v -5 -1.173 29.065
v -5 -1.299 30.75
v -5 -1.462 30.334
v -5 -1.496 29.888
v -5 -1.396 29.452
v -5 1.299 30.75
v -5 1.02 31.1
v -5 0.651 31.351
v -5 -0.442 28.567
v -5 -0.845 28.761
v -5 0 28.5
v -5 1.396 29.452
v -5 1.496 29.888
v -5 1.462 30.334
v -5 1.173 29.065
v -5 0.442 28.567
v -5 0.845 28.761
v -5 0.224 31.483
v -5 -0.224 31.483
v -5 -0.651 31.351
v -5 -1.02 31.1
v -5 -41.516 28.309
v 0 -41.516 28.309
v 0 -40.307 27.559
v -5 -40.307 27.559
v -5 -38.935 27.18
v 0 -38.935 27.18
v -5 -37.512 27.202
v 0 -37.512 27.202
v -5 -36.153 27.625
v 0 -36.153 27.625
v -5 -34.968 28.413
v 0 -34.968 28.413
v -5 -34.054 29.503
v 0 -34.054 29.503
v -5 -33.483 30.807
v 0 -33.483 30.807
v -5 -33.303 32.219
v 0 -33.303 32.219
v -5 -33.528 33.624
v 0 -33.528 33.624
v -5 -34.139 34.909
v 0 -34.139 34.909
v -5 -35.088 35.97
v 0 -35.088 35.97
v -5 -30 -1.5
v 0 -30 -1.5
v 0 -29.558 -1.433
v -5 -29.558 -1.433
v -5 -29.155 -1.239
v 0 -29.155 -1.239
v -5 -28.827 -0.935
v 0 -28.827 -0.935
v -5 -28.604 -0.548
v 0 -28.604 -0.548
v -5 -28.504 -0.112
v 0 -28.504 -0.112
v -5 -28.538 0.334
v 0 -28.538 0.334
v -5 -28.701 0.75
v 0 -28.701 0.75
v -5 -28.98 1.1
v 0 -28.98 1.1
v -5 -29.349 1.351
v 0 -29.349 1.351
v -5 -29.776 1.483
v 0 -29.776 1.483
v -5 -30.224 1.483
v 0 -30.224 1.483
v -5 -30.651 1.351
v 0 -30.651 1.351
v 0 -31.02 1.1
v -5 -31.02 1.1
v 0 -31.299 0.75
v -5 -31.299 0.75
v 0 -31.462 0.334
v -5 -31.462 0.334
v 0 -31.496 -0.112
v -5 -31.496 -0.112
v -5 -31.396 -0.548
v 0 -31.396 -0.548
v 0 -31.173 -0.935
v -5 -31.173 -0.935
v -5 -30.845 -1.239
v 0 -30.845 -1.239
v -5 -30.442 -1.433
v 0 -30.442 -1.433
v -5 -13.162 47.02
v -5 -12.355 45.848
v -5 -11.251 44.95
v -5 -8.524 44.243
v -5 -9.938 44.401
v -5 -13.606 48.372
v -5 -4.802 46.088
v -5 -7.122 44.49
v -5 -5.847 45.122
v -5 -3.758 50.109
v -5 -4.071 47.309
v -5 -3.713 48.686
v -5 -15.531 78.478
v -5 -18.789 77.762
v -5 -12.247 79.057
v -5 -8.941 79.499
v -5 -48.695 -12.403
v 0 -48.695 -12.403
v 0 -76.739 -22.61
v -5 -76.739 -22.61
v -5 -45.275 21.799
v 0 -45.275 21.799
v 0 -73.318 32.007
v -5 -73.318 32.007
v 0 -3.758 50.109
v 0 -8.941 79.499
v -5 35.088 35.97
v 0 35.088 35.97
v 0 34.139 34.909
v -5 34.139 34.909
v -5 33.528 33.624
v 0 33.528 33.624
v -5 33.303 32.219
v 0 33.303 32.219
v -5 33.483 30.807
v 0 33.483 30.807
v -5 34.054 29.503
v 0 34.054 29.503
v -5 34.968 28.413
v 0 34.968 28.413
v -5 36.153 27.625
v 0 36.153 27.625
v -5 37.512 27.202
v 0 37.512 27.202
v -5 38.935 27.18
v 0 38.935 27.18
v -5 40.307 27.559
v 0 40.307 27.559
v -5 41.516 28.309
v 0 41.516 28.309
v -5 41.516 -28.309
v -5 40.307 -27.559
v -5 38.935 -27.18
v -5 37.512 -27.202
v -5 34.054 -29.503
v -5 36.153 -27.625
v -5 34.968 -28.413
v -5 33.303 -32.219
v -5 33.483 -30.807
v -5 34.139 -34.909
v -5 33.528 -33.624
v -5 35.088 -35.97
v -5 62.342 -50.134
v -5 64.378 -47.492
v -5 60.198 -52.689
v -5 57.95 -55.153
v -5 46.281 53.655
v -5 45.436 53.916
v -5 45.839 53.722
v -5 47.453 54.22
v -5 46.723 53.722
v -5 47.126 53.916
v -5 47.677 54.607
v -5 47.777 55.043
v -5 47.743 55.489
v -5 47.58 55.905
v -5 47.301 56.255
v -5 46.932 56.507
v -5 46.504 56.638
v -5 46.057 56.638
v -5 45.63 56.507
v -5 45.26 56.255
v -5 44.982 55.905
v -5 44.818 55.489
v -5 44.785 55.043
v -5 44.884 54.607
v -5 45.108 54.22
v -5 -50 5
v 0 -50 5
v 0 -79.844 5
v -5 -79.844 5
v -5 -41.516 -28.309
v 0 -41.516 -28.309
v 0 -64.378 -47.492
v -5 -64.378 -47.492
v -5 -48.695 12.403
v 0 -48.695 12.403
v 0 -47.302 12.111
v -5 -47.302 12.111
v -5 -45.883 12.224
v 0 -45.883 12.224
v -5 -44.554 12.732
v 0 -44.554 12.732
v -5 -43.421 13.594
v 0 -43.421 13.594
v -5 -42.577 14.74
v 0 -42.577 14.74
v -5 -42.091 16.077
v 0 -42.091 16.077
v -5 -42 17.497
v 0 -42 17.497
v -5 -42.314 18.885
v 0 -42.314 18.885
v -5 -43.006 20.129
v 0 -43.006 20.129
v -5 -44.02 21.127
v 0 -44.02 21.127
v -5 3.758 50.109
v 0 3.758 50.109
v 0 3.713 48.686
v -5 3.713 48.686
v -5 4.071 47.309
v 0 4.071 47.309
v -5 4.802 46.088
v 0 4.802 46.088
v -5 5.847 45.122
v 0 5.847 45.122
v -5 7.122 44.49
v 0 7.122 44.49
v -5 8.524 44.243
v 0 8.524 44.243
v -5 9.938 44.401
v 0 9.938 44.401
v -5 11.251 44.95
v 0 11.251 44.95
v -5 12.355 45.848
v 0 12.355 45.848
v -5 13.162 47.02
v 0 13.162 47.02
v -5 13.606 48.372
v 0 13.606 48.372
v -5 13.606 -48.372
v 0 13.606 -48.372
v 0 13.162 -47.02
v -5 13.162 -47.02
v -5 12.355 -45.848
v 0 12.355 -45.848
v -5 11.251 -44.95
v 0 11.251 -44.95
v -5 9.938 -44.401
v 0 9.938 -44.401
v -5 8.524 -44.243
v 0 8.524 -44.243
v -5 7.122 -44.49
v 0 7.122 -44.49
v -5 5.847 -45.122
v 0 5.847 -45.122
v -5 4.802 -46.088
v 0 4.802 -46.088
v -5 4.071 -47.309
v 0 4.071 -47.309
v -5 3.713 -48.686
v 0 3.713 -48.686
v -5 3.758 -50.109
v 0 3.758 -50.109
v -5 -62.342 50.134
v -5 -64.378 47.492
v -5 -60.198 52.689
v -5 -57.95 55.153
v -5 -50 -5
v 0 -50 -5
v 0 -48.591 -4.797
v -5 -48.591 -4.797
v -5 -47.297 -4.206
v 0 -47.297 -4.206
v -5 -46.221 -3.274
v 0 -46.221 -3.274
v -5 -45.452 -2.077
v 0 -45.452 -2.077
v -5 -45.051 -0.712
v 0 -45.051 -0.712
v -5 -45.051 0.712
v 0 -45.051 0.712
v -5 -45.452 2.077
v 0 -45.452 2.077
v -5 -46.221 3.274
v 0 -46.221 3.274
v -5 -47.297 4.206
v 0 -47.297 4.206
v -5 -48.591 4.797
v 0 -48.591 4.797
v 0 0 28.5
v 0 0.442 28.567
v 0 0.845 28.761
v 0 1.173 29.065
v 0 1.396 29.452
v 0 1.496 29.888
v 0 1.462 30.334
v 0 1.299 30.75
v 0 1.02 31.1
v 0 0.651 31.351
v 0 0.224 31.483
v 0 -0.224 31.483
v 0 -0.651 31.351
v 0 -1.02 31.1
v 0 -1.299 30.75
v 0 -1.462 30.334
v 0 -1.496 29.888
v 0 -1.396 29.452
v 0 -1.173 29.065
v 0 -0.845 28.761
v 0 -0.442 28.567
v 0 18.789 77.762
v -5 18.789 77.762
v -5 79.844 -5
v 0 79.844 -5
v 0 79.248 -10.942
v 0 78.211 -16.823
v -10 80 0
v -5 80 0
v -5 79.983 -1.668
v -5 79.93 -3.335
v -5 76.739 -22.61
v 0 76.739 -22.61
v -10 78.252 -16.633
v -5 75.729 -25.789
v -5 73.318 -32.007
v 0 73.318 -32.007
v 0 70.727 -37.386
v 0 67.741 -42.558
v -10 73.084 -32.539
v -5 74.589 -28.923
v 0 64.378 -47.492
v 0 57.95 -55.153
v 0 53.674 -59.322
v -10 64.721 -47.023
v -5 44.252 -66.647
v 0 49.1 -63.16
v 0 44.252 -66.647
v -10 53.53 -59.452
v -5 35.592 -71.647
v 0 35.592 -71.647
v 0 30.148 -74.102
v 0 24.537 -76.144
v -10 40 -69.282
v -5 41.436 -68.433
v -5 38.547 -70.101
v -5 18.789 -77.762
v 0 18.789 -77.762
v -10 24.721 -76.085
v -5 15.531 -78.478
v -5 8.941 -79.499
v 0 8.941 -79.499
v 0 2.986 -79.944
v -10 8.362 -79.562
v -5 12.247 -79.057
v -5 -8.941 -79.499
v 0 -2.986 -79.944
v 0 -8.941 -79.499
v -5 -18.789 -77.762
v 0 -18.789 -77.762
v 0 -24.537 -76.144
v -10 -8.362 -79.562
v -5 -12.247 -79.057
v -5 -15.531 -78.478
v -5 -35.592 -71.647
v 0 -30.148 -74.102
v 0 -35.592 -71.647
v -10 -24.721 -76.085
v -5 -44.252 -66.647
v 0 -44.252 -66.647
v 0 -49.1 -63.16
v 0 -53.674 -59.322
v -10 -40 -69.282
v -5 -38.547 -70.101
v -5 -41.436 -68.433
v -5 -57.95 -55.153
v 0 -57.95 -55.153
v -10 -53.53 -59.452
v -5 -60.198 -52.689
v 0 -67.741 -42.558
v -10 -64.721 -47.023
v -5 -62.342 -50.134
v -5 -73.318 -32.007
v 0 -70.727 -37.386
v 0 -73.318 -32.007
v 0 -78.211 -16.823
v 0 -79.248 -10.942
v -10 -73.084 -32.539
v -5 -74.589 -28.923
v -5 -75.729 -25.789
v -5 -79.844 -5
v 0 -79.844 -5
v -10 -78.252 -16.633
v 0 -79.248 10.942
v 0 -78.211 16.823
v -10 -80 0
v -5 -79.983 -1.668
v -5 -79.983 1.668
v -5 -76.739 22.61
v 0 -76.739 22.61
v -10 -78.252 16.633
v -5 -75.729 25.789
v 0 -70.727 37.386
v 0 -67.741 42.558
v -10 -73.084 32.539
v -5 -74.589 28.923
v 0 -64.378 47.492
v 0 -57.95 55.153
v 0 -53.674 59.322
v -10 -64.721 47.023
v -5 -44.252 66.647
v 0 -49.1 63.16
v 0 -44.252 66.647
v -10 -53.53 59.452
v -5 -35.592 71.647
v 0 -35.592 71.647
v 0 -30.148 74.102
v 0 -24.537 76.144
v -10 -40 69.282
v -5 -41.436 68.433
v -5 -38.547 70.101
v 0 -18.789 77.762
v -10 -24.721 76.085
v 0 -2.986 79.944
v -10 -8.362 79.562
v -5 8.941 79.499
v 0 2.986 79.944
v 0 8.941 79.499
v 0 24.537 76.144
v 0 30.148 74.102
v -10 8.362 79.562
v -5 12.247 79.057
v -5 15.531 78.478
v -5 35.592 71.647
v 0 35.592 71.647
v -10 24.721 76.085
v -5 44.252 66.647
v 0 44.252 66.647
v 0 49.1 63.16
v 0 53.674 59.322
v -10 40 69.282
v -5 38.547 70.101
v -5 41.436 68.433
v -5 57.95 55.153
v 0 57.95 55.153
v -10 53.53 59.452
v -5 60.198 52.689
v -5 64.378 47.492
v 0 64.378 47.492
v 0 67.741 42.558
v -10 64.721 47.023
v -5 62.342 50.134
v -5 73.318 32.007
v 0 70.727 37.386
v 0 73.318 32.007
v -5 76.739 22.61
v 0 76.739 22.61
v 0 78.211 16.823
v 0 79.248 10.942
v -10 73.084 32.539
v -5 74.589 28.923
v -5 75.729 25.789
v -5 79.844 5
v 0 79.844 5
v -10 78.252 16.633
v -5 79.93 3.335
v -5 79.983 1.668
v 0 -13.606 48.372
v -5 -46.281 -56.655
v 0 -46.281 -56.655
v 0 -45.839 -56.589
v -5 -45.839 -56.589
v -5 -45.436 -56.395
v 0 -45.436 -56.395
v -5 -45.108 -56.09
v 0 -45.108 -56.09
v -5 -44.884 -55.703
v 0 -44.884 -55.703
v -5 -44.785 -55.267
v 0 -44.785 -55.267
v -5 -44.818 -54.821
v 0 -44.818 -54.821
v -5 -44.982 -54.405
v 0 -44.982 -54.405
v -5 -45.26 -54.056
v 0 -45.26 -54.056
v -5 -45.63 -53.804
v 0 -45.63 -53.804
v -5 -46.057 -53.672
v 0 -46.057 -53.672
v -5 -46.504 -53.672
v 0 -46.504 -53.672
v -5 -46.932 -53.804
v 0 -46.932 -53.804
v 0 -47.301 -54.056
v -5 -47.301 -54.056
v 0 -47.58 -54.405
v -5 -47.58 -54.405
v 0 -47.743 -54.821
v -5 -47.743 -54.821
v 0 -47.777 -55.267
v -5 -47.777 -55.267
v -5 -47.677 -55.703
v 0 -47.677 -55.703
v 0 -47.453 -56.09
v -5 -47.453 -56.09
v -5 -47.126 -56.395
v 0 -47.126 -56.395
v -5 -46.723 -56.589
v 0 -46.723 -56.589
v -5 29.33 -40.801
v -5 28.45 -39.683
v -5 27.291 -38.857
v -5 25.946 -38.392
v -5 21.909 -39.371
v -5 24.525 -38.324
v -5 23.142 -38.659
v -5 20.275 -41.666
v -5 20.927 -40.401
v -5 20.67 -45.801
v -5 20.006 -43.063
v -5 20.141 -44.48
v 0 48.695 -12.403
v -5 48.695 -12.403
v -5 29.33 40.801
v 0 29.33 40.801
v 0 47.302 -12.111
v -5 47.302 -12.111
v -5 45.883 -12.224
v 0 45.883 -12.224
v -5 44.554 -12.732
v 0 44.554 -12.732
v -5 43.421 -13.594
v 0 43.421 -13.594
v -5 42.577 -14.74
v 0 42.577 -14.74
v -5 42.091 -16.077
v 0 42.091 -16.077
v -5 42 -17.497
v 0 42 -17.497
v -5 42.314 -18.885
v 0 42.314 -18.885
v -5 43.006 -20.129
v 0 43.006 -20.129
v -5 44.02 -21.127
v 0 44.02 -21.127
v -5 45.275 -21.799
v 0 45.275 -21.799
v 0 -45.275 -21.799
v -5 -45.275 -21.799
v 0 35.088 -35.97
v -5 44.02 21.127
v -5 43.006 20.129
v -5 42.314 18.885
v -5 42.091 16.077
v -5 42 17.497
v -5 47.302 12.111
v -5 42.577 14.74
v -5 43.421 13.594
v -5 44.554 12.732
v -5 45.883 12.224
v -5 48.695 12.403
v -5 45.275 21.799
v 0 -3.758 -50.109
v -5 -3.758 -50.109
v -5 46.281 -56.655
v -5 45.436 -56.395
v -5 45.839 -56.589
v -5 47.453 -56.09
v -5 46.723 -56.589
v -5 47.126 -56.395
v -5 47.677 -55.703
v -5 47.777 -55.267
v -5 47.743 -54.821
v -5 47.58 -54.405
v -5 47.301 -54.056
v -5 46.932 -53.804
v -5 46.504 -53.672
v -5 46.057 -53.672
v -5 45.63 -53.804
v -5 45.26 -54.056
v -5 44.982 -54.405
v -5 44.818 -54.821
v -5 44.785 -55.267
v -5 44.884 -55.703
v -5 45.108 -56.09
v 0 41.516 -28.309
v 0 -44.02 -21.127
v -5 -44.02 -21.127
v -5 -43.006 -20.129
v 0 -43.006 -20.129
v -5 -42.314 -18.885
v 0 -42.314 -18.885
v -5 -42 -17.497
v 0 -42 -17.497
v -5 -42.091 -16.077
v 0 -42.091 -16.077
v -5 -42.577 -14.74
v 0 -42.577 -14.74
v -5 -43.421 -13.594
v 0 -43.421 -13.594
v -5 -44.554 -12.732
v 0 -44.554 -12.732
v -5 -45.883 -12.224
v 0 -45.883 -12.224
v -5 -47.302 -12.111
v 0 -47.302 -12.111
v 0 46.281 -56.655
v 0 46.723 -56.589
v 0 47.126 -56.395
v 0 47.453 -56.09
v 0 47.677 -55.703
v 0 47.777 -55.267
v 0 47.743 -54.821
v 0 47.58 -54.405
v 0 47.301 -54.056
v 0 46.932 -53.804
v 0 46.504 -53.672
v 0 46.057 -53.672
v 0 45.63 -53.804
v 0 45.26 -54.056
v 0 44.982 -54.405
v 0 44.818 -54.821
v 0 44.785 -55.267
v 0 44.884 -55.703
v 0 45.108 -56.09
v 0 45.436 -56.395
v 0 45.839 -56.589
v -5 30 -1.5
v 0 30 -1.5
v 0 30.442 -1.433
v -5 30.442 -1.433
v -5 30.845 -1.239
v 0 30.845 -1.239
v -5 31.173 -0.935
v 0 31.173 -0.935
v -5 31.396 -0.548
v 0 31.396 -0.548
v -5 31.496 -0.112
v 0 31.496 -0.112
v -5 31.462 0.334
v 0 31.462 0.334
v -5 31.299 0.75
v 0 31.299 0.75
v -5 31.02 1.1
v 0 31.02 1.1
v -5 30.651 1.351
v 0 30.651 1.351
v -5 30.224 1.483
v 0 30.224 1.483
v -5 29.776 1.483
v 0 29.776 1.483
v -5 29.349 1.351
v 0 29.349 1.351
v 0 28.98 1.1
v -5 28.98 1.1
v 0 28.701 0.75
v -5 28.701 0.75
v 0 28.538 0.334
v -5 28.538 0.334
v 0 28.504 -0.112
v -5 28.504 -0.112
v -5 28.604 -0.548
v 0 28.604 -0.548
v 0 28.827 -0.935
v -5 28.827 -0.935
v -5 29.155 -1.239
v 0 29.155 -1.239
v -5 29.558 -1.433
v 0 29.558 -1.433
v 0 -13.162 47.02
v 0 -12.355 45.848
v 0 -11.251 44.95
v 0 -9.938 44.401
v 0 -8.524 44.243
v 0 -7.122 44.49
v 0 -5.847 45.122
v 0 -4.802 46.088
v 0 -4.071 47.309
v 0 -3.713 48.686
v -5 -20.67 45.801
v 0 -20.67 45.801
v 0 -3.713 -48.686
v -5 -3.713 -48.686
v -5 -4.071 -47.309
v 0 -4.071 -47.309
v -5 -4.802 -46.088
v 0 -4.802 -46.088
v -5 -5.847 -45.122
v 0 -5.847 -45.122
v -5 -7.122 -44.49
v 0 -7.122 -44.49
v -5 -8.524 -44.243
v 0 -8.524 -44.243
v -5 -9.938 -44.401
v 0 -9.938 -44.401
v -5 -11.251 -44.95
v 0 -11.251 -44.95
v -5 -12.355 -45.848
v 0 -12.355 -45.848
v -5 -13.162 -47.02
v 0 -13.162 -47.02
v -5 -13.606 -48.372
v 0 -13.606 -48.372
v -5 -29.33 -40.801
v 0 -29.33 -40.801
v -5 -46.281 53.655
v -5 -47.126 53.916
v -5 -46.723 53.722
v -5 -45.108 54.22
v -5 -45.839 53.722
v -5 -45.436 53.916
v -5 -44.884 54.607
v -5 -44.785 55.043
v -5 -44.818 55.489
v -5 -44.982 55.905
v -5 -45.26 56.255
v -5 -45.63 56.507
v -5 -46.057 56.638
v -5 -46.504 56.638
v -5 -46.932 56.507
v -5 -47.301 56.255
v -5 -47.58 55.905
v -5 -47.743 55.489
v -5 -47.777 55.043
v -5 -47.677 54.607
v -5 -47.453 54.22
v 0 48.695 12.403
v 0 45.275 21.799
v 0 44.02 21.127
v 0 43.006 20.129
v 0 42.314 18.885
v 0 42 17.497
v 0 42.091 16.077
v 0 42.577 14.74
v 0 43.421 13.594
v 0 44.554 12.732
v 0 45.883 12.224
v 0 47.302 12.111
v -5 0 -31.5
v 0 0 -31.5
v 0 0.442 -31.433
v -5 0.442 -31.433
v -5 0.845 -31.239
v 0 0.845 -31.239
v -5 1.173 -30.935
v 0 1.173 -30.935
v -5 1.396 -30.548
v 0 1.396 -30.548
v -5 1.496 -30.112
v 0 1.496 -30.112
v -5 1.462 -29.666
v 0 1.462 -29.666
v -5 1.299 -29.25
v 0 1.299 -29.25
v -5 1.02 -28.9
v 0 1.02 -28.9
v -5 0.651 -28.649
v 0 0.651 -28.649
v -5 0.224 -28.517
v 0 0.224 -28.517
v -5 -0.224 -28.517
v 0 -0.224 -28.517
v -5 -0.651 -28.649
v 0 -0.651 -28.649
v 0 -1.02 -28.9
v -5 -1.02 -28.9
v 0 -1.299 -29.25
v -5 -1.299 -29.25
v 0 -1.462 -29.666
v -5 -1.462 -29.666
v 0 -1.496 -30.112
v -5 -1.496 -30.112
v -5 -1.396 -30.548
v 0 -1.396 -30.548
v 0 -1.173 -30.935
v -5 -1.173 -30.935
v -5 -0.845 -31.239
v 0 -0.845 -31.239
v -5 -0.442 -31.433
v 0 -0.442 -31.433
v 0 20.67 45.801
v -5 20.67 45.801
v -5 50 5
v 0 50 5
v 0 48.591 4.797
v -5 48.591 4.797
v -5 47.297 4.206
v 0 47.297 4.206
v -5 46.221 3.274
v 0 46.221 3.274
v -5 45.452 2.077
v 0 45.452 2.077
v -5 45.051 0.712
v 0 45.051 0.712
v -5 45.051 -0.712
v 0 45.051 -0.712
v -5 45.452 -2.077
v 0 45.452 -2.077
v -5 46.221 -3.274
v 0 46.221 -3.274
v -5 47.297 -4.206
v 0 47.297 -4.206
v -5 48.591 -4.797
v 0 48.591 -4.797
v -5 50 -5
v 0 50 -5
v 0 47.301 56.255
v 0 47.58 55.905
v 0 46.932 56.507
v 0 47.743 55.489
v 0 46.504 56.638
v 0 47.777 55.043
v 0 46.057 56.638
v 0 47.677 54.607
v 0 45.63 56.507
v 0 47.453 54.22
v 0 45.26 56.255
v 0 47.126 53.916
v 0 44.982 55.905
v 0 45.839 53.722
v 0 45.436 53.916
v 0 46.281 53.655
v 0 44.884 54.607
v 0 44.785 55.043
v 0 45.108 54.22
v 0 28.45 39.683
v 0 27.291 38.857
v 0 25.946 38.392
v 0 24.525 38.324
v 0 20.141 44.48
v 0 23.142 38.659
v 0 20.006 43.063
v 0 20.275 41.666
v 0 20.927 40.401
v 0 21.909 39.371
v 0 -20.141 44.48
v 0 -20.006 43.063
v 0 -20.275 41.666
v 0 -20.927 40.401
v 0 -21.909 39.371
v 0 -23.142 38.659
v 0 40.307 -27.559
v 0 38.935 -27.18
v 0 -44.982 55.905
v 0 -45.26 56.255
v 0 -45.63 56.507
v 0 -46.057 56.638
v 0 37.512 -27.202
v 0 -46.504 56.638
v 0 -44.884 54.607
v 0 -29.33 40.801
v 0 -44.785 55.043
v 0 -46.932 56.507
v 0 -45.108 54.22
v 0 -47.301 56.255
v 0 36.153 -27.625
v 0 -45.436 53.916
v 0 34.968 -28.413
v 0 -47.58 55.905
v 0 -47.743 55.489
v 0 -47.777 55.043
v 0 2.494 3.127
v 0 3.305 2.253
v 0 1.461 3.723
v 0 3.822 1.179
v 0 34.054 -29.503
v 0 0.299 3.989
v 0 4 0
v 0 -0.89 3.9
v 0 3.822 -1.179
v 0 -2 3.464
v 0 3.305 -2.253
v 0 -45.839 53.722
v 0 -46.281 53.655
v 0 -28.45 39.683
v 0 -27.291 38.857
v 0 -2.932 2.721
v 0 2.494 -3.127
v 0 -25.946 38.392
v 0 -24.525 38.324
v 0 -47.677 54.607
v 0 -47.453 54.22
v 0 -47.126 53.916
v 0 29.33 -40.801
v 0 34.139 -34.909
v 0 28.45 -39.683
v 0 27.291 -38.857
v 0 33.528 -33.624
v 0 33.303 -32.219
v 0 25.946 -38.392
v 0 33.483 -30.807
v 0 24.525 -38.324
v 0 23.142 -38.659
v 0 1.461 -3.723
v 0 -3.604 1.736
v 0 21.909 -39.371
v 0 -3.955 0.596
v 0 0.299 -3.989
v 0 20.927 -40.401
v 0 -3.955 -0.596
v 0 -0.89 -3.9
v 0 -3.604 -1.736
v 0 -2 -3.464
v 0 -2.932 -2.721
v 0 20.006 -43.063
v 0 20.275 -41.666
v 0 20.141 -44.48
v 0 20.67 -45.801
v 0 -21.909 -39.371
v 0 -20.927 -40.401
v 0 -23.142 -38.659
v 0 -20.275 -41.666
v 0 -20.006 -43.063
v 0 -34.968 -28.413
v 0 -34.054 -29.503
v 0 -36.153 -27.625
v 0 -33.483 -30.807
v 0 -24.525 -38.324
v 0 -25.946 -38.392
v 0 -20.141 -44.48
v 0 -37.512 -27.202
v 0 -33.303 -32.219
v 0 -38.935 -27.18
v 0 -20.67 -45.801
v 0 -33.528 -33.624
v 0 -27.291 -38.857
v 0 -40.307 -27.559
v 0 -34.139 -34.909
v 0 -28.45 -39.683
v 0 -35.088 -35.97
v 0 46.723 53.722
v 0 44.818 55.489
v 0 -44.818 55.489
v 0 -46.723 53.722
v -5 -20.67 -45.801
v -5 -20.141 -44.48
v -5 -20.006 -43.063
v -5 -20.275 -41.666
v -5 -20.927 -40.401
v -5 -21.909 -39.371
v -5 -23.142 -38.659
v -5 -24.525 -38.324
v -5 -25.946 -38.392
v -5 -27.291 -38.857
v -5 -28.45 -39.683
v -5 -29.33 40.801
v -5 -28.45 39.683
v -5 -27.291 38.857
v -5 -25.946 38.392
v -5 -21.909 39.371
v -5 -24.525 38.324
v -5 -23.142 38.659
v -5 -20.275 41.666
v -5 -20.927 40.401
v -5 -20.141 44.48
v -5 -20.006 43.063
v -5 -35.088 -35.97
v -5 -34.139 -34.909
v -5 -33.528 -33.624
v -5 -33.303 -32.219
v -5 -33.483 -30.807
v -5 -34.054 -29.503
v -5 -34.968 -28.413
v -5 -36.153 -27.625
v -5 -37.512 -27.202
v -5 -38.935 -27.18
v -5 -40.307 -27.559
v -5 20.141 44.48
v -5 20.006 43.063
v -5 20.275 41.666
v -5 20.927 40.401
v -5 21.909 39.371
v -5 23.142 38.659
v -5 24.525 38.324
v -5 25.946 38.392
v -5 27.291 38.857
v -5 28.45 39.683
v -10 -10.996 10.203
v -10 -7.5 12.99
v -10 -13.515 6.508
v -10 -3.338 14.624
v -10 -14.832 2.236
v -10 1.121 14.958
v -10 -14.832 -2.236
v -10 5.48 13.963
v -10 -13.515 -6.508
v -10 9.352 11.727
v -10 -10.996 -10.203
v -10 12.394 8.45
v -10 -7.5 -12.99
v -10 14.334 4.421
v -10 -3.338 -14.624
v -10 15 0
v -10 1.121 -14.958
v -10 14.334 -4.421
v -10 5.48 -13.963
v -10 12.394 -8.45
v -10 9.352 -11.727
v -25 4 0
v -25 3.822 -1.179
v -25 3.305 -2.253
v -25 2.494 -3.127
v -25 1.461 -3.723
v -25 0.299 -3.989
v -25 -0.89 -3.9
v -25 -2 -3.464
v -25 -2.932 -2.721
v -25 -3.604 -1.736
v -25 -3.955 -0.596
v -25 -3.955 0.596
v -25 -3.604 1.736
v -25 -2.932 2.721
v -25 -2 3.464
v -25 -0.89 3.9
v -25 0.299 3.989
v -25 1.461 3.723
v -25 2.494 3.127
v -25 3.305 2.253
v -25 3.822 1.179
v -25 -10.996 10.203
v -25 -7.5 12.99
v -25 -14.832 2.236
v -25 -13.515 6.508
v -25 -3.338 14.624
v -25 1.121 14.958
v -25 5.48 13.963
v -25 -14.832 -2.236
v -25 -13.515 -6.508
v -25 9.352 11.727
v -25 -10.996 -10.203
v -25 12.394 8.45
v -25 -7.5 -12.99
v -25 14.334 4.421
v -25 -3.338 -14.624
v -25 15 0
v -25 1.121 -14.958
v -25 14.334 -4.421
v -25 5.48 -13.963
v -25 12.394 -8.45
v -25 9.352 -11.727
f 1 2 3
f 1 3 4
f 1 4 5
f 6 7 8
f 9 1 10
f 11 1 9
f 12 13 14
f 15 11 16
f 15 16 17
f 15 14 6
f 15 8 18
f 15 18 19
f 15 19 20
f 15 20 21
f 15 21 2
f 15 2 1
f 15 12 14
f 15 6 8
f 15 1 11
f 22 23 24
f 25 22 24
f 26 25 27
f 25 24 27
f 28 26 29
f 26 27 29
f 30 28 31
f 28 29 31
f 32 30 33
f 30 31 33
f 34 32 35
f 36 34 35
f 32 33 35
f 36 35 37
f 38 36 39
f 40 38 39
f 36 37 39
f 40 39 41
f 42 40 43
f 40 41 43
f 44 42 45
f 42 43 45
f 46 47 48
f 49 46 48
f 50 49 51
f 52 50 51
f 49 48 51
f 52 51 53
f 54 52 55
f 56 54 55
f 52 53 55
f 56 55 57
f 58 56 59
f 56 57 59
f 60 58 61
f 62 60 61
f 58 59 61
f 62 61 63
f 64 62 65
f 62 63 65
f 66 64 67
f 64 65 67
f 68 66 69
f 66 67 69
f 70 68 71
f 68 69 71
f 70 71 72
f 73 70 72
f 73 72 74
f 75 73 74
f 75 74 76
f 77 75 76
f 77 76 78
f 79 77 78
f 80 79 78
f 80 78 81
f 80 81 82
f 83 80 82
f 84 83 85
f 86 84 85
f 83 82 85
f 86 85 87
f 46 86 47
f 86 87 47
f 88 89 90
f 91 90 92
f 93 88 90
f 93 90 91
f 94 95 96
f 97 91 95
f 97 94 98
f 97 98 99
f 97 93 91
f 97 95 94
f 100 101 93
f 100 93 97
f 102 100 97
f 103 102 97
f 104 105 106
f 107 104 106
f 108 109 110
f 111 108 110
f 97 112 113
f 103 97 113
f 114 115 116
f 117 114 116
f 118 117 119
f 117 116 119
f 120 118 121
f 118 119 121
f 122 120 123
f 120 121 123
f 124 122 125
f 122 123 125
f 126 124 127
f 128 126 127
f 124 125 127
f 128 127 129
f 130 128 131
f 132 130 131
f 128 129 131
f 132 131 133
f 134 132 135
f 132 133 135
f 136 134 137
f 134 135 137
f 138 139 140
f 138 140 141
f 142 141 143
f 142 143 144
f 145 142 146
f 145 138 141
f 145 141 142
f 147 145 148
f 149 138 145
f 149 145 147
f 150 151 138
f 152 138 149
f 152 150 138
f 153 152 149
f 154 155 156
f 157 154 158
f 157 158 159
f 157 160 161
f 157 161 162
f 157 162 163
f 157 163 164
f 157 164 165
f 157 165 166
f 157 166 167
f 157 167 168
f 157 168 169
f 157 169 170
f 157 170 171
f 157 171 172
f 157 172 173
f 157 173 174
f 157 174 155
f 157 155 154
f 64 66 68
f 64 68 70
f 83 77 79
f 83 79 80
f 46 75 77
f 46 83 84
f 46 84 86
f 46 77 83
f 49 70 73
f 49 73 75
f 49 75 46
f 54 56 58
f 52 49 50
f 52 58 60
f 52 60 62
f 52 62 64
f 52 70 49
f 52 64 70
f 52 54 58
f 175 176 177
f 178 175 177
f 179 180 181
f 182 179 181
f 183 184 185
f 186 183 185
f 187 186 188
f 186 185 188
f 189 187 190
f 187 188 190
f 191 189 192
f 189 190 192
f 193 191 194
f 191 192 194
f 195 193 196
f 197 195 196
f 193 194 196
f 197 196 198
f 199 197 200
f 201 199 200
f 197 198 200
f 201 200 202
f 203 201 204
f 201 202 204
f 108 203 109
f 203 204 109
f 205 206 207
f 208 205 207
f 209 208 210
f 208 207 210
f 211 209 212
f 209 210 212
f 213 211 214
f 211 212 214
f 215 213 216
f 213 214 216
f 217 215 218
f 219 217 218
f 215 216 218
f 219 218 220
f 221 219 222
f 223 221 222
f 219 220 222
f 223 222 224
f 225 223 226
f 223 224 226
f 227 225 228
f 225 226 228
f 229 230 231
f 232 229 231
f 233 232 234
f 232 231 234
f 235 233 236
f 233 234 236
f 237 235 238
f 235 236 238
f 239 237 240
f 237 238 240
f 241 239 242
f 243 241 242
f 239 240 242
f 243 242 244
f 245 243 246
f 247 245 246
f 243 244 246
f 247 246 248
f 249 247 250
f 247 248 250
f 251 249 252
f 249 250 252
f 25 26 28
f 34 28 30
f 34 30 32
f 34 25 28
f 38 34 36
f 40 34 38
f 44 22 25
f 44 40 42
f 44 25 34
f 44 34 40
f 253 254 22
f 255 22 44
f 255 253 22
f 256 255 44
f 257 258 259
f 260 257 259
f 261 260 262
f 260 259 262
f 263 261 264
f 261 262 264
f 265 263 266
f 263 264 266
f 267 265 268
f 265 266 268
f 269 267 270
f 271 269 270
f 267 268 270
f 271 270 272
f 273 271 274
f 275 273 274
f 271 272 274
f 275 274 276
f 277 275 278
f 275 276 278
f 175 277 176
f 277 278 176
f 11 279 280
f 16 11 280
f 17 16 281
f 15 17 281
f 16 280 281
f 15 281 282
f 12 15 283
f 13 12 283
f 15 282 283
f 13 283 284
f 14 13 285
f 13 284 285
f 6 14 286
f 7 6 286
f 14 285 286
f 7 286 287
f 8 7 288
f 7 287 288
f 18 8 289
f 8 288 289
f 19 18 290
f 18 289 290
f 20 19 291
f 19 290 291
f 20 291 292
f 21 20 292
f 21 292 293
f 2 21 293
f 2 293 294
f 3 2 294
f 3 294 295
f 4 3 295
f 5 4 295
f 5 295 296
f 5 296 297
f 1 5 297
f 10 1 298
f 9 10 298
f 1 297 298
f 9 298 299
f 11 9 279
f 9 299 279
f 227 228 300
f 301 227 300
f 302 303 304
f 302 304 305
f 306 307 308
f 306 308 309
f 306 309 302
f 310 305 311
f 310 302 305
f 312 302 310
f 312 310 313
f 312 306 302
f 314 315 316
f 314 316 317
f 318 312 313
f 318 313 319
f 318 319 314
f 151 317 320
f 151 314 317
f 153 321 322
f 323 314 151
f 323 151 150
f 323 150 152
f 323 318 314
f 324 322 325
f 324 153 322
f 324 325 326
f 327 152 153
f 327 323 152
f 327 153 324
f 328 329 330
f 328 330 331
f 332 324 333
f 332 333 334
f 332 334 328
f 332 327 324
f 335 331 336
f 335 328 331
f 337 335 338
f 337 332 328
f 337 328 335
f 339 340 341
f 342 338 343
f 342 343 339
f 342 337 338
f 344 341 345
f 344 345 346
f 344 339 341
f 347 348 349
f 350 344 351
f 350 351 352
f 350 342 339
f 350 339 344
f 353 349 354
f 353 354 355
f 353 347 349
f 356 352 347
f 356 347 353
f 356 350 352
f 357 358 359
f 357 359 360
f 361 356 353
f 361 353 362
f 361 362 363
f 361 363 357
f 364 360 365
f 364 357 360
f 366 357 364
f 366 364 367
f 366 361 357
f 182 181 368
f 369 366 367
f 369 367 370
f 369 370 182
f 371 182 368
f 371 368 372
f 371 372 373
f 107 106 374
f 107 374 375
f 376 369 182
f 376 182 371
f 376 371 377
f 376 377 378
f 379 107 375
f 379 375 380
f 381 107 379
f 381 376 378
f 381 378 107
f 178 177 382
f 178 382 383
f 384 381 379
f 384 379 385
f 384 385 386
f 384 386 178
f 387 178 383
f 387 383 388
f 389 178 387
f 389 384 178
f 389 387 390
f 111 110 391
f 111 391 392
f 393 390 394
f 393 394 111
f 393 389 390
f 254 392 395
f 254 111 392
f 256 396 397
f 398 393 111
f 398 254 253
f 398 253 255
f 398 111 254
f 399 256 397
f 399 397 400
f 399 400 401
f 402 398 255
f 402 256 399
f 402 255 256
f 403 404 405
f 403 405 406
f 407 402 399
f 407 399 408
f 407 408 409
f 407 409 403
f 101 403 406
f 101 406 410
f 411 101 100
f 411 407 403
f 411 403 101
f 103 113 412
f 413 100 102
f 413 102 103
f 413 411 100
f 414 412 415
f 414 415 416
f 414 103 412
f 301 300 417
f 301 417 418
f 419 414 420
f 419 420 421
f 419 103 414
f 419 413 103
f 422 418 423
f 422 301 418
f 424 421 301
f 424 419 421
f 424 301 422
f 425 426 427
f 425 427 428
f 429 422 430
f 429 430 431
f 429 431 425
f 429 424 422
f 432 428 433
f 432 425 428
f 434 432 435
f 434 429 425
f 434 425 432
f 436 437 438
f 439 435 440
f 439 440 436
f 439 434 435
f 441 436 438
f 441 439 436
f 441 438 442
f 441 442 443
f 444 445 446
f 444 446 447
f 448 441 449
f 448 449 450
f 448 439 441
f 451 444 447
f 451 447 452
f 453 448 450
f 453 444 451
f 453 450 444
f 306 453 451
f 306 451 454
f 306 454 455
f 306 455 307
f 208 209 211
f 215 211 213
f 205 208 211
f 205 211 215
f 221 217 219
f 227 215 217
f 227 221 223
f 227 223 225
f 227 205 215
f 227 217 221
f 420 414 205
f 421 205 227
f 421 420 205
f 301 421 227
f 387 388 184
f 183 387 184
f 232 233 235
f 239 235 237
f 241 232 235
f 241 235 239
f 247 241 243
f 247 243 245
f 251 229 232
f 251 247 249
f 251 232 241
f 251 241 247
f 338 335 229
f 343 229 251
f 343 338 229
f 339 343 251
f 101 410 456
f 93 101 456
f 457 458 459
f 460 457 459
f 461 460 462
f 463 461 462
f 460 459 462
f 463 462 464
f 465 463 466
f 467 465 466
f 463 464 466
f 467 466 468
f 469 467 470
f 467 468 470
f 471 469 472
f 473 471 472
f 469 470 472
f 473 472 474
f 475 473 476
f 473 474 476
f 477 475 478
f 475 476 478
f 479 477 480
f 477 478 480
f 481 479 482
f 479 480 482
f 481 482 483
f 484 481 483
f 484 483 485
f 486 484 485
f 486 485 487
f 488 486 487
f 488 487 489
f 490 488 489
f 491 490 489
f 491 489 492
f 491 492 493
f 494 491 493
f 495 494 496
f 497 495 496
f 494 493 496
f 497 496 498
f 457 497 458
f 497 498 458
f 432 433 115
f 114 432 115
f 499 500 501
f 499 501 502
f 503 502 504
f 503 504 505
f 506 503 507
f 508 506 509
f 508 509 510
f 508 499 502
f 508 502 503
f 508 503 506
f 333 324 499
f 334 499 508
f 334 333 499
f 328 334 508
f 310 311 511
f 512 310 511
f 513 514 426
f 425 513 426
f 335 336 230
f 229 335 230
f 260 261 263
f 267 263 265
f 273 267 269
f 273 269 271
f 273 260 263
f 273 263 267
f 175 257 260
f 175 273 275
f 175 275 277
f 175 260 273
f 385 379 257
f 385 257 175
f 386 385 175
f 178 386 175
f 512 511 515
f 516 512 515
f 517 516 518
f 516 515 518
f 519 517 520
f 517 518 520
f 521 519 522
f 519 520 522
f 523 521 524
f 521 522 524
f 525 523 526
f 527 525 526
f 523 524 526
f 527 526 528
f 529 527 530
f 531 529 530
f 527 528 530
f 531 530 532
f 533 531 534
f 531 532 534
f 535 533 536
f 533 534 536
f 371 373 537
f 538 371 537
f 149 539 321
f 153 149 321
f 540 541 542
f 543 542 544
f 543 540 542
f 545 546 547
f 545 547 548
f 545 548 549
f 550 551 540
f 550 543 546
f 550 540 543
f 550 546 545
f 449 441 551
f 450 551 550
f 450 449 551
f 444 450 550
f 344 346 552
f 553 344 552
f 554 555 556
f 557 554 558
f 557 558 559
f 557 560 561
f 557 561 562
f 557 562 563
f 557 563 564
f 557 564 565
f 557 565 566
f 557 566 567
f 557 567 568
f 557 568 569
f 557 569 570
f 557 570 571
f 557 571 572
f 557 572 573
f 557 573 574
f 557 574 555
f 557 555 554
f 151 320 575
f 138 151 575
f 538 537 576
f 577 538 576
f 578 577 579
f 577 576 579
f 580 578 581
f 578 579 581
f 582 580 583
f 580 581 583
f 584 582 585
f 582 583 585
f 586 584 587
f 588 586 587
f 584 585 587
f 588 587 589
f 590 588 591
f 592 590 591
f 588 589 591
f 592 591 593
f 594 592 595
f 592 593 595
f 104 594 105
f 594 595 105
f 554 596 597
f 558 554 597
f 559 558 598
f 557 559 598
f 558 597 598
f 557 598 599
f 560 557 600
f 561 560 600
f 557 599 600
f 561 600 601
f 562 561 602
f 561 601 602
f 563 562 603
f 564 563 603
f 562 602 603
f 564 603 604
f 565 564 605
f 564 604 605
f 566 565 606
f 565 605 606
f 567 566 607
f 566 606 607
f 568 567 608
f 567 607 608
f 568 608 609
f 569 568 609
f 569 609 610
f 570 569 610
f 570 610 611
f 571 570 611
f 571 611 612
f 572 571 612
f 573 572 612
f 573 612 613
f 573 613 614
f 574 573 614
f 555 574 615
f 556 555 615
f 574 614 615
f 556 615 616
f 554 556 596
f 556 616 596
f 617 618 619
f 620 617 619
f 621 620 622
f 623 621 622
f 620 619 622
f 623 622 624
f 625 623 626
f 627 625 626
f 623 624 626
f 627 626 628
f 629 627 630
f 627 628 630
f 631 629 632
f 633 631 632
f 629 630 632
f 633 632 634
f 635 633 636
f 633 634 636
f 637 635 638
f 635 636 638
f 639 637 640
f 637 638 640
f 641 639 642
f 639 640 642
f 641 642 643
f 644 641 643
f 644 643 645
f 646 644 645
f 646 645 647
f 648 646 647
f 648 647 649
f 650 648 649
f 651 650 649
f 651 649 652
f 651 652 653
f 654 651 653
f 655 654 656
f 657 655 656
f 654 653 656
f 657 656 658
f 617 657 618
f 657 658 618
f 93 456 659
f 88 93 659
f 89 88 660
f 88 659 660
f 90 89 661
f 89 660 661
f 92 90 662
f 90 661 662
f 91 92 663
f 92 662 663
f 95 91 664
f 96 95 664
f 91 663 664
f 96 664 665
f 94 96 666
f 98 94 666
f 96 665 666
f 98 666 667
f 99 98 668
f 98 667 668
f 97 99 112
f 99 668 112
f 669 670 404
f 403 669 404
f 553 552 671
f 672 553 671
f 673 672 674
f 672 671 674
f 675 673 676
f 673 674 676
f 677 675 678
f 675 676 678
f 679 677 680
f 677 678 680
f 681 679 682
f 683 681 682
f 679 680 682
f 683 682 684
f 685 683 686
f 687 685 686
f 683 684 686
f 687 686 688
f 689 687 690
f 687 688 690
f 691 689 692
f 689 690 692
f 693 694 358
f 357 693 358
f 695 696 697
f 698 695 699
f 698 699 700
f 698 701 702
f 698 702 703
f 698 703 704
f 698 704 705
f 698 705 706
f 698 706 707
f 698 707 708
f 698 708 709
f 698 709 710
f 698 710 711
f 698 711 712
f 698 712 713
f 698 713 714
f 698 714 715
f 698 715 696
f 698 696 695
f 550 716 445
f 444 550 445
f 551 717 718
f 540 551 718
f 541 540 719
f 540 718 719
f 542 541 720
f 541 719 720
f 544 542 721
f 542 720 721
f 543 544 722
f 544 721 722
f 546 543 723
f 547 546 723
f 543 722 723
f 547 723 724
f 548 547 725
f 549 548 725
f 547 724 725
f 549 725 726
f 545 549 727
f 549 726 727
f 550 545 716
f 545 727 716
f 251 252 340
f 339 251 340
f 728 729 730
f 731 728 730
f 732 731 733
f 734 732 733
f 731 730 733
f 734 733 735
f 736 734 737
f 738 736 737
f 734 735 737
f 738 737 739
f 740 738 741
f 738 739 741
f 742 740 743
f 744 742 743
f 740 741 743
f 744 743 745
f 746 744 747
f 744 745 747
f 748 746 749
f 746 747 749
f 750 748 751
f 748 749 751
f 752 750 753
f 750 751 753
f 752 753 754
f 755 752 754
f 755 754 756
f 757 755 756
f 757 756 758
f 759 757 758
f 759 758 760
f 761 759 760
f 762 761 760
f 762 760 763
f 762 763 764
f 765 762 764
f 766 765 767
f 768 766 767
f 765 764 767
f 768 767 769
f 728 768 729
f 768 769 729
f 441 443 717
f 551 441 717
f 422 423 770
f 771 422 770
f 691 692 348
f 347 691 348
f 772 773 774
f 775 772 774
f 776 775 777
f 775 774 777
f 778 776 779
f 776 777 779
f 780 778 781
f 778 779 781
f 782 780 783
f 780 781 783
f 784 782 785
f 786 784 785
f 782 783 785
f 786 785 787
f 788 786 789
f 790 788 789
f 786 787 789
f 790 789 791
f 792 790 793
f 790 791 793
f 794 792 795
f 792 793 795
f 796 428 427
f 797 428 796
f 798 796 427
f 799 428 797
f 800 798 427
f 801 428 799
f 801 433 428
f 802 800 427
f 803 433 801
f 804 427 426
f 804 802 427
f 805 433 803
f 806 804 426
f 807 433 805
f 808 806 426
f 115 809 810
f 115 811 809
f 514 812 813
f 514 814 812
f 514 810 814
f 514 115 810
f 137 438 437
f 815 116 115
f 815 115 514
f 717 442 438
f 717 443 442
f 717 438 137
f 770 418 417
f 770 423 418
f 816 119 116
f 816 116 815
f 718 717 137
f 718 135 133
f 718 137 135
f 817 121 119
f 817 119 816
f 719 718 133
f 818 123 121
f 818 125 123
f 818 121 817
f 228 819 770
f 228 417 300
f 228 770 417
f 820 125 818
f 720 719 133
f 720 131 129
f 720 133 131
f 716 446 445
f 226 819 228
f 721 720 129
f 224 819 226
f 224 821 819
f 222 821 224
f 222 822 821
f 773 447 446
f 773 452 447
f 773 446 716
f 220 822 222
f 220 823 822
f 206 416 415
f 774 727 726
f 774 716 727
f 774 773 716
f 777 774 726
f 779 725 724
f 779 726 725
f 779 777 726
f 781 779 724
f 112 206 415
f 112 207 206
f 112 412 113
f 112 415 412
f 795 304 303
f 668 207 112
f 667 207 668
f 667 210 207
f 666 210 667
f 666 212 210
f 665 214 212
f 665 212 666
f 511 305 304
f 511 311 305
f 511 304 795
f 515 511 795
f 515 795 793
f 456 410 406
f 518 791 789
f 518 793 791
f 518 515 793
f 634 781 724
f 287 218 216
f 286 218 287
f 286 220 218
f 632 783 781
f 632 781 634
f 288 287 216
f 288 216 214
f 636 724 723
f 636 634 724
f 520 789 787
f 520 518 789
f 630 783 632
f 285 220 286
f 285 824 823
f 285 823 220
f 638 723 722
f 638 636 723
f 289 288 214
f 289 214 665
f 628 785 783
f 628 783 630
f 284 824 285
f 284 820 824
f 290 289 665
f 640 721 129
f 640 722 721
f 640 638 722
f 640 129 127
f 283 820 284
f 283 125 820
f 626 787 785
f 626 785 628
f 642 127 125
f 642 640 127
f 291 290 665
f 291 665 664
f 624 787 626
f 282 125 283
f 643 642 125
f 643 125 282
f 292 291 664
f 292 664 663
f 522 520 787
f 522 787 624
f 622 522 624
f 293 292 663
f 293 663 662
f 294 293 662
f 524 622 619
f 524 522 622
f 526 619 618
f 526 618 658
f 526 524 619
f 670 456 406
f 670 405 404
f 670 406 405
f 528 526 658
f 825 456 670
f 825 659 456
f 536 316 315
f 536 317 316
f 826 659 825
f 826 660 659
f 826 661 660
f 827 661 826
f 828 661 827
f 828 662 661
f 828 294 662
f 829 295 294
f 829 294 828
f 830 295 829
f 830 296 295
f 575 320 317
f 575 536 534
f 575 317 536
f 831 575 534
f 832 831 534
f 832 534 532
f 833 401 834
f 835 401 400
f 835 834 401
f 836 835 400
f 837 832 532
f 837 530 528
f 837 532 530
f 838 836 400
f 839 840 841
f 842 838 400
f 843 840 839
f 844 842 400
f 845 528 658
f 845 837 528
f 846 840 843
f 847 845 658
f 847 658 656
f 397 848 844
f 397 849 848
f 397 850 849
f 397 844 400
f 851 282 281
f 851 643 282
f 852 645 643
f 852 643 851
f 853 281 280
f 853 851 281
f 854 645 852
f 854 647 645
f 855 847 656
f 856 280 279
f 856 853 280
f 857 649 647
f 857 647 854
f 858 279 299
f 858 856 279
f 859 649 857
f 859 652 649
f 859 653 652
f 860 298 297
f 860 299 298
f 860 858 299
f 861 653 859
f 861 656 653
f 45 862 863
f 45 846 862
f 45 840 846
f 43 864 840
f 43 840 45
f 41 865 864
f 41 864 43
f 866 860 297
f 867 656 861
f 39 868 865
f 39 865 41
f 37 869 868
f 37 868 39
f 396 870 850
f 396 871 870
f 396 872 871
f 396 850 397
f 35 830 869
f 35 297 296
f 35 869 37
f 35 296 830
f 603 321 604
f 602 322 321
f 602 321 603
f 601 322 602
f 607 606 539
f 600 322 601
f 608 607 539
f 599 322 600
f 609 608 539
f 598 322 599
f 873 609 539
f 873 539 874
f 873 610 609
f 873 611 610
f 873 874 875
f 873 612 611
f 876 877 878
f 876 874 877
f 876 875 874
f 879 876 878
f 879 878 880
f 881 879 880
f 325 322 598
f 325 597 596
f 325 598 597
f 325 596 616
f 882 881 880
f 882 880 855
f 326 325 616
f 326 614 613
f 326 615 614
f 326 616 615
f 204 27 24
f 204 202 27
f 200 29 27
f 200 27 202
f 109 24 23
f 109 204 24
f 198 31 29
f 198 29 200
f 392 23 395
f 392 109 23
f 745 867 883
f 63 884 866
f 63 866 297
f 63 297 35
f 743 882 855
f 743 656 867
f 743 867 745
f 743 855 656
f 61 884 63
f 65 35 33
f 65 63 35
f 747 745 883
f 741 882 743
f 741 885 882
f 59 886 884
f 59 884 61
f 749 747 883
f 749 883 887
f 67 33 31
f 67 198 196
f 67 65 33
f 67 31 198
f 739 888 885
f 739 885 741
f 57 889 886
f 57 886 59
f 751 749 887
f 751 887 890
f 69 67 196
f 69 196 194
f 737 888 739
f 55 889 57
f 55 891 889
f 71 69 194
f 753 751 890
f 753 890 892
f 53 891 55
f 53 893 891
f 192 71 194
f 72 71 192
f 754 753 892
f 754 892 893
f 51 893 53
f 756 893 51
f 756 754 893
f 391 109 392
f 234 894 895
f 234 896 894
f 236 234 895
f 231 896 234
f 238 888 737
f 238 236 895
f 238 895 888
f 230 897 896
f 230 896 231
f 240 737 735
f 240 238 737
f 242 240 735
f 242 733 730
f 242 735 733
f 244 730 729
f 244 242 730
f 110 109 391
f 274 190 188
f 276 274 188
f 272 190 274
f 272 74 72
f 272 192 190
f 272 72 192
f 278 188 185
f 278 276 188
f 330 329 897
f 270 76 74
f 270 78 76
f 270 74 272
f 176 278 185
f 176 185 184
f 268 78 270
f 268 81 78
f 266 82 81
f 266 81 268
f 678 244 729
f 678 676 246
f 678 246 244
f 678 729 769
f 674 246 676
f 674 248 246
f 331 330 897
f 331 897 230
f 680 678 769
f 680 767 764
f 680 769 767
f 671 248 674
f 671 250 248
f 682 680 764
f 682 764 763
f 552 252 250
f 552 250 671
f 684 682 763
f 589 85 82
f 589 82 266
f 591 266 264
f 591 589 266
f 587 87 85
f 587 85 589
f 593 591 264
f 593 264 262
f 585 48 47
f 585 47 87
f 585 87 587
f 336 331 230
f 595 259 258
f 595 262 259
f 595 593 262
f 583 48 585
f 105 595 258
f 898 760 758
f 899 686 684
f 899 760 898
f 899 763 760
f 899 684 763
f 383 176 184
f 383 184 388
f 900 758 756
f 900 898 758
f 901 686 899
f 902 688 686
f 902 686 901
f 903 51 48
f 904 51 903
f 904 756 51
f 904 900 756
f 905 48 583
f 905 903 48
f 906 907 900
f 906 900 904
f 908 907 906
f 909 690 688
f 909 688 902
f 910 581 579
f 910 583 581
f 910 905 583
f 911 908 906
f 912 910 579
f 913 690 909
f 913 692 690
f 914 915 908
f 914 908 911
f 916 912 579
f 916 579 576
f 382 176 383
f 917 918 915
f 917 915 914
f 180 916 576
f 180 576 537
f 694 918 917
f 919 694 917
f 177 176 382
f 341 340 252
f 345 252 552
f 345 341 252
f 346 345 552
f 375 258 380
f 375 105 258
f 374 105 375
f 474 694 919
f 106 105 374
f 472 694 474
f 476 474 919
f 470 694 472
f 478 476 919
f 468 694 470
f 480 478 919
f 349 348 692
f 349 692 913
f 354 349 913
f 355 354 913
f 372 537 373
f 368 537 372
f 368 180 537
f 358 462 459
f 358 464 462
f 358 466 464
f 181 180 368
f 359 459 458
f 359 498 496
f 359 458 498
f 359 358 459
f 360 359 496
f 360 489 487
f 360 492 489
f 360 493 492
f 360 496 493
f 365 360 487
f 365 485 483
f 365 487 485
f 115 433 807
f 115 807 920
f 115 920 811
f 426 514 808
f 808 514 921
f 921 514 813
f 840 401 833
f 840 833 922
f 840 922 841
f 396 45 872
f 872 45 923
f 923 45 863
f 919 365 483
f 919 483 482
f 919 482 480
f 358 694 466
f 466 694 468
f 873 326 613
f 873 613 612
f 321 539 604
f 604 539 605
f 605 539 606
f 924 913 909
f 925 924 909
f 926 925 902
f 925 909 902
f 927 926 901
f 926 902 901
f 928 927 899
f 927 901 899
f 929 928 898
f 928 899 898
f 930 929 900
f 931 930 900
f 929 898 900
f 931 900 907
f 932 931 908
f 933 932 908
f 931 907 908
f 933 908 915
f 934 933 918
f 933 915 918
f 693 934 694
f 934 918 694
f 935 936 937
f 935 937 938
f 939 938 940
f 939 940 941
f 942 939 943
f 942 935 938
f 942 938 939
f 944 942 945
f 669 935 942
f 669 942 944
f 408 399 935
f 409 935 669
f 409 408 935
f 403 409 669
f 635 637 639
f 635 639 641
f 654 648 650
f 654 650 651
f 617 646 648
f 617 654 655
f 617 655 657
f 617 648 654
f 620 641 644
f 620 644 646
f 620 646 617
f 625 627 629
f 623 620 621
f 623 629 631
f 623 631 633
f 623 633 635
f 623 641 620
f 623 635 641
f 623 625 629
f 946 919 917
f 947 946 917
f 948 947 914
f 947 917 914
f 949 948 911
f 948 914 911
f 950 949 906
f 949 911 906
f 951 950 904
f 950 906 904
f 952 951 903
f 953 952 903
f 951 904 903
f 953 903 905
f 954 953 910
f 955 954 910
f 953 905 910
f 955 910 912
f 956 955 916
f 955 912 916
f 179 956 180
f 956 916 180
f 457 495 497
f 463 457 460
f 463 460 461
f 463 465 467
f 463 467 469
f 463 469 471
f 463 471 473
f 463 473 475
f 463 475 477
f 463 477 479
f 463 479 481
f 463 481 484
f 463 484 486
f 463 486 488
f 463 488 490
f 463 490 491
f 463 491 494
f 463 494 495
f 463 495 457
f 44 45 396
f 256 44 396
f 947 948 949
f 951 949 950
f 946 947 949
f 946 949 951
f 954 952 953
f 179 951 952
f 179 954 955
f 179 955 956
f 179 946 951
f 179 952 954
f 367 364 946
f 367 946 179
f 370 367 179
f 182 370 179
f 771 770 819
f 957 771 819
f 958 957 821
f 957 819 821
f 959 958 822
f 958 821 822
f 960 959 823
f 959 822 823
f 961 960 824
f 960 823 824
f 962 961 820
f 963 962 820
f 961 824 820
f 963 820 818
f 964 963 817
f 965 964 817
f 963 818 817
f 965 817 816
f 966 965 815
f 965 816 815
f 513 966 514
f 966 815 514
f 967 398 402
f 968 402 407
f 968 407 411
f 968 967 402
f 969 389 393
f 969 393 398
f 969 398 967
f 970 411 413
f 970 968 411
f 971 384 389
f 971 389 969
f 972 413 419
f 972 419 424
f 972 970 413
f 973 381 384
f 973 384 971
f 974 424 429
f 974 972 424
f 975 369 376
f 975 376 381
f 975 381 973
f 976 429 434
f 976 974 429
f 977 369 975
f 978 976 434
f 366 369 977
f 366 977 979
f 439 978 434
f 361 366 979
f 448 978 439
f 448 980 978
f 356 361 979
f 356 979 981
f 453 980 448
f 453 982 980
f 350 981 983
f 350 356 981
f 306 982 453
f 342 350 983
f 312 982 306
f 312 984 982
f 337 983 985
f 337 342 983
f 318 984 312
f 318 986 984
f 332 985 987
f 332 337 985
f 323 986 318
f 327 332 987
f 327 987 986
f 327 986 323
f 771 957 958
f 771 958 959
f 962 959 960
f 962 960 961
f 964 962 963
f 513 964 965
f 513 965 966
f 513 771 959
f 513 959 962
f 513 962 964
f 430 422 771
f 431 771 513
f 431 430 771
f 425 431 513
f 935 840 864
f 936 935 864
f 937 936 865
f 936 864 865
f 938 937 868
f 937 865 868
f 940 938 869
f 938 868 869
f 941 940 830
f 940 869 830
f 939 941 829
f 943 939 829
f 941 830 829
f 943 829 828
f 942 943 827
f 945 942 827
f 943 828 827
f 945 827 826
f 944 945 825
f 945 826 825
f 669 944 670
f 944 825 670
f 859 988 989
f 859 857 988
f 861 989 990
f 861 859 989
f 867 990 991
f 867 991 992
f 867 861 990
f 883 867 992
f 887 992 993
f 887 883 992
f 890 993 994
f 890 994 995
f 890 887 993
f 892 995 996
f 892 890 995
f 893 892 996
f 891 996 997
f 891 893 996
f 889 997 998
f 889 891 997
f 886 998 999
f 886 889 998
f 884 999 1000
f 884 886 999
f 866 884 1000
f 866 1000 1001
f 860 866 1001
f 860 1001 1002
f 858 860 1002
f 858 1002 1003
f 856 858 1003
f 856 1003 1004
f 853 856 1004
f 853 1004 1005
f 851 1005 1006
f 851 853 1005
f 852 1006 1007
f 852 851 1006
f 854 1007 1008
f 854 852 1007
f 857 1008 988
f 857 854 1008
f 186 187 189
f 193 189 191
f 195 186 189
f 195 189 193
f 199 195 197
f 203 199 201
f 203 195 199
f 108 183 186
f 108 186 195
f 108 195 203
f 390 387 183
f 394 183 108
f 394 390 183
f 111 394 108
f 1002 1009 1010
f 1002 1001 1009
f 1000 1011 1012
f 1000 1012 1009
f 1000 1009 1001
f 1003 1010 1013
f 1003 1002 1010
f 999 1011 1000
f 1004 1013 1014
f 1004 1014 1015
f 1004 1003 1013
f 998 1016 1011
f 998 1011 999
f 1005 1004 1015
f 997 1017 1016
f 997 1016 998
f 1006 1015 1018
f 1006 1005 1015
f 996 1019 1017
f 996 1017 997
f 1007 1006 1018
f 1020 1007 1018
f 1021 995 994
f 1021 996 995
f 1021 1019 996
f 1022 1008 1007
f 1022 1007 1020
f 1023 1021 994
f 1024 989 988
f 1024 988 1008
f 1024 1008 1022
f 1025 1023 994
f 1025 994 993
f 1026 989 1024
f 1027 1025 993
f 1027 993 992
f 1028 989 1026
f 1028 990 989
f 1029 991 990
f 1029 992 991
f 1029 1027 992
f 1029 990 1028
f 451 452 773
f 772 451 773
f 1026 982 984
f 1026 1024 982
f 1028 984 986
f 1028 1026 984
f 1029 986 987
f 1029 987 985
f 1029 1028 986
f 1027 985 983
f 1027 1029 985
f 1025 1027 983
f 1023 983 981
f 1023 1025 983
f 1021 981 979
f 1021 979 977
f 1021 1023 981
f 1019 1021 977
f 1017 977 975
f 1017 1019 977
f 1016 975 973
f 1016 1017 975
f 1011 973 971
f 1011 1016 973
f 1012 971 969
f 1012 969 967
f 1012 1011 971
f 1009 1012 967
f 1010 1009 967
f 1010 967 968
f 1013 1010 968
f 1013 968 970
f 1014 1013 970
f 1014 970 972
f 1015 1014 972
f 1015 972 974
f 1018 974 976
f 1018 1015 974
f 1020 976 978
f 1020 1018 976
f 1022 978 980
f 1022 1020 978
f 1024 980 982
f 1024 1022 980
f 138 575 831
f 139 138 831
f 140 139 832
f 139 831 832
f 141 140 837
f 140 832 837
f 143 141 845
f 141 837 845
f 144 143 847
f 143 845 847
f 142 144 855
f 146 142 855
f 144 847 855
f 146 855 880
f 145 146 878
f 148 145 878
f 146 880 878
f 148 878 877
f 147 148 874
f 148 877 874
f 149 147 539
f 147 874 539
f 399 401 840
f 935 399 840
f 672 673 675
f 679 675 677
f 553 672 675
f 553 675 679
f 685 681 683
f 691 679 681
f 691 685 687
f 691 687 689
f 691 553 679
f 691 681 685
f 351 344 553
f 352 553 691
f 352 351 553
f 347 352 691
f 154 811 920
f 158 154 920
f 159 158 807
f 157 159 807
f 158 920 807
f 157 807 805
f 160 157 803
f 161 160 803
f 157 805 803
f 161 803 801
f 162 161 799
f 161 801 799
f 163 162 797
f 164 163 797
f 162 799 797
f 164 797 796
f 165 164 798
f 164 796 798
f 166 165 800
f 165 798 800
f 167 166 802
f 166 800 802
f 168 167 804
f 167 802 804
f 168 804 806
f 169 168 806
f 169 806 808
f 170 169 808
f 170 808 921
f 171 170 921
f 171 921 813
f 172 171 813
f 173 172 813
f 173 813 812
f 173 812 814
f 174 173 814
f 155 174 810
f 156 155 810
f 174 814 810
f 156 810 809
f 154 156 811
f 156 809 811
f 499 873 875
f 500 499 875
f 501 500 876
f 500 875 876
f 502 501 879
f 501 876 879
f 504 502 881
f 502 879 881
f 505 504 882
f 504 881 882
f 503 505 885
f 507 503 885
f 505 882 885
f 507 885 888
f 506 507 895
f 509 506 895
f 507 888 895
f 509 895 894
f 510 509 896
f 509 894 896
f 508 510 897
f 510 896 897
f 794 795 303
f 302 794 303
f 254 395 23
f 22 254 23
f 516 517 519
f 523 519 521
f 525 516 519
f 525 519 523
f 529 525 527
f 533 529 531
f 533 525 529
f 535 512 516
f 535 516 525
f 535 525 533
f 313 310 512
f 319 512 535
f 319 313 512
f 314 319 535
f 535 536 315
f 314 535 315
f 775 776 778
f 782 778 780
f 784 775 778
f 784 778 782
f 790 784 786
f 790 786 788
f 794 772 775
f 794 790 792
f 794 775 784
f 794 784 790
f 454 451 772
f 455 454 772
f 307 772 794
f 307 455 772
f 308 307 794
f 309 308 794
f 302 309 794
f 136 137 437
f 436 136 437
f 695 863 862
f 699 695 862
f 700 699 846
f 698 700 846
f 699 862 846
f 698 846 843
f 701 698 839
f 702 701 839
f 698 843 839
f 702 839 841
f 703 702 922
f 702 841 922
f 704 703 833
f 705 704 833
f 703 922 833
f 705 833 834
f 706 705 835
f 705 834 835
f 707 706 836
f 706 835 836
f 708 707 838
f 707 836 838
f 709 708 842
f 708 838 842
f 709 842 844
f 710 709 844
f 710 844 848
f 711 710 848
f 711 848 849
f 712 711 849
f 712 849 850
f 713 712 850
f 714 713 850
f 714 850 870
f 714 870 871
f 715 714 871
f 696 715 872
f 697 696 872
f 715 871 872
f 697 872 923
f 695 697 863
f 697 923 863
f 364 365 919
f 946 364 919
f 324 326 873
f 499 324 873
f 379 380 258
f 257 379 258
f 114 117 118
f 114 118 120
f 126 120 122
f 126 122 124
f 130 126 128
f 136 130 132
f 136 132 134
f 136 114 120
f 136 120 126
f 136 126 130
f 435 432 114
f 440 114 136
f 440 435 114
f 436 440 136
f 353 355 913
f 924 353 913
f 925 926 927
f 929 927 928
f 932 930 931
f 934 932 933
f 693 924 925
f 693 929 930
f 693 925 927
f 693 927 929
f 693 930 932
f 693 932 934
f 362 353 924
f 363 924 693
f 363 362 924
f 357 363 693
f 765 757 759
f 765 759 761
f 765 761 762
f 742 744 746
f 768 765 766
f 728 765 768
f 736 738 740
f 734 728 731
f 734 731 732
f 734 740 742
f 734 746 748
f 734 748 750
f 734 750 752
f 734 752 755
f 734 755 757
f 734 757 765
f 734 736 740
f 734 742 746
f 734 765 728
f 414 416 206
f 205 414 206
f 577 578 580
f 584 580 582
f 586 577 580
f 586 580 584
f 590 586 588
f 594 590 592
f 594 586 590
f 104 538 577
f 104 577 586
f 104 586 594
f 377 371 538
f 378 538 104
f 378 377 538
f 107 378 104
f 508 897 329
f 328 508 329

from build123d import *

# Parameters (mm, degrees)
CUT_EXTRUDE1_DEPTH = 5
CIRPATTERN1_COUNT  = 18
SKETCH4_R          = 1.5
CUT_EXTRUDE3_DEPTH = 5


with BuildPart() as part:
    # Sketch1 → Revolve2 (revolve)
    with BuildSketch(Plane.XY):
        Polygon((0, 4), (0, 80), (-10, 80), (-10, 15), (-25, 15), (-25, 4), align=None)
    revolve(axis=Axis((0, 0, 0), (-1, 0, 0)))

    # Sketch2 → Cut-Extrude1 (cut)
    with BuildSketch(Plane(origin=(0, 0, 0), x_dir=(0, 0, -1), z_dir=(1, 0, 0))):
        with BuildLine():
            Line((5, 50), (5, 80))
            Line((5, 80), (-5, 80))
            Line((-5, 80), (-5, 50))
            ThreePointArc((-5, 50), (0, 45), (5, 50))
        make_face()
    cut_extrude1 = extrude(amount=-CUT_EXTRUDE1_DEPTH, mode=Mode.SUBTRACT)

    # CirPattern1: Cut-Extrude1 ×18 about axis
    cirpattern1_axis = Axis((0, 0, 0), (1, 0, 0))
    for i in range(1, CIRPATTERN1_COUNT):
        add(cut_extrude1.rotate(cirpattern1_axis, i * 360 / CIRPATTERN1_COUNT), mode=Mode.SUBTRACT)

    # Sketch4 → Cut-Extrude3 (cut)
    with BuildSketch(Plane(origin=(0, 0, 0), x_dir=(0, 0, -1), z_dir=(1, 0, 0))):
        with Locations((-55.155199905, 46.280707897)):
            Circle(SKETCH4_R)
        with Locations((55.155199905, 46.280707897)):
            Circle(SKETCH4_R)
        with Locations((55.155199905, -46.280707897)):
            Circle(SKETCH4_R)
        with Locations((-55.155199905, -46.280707897)):
            Circle(SKETCH4_R)
        with Locations((0, 30)):
            Circle(SKETCH4_R)
        with Locations((30, 0)):
            Circle(SKETCH4_R)
        with Locations((0, -30)):
            Circle(SKETCH4_R)
        with Locations((-30, 0)):
            Circle(SKETCH4_R)
    extrude(amount=-CUT_EXTRUDE3_DEPTH, mode=Mode.SUBTRACT)


solid = part.part
